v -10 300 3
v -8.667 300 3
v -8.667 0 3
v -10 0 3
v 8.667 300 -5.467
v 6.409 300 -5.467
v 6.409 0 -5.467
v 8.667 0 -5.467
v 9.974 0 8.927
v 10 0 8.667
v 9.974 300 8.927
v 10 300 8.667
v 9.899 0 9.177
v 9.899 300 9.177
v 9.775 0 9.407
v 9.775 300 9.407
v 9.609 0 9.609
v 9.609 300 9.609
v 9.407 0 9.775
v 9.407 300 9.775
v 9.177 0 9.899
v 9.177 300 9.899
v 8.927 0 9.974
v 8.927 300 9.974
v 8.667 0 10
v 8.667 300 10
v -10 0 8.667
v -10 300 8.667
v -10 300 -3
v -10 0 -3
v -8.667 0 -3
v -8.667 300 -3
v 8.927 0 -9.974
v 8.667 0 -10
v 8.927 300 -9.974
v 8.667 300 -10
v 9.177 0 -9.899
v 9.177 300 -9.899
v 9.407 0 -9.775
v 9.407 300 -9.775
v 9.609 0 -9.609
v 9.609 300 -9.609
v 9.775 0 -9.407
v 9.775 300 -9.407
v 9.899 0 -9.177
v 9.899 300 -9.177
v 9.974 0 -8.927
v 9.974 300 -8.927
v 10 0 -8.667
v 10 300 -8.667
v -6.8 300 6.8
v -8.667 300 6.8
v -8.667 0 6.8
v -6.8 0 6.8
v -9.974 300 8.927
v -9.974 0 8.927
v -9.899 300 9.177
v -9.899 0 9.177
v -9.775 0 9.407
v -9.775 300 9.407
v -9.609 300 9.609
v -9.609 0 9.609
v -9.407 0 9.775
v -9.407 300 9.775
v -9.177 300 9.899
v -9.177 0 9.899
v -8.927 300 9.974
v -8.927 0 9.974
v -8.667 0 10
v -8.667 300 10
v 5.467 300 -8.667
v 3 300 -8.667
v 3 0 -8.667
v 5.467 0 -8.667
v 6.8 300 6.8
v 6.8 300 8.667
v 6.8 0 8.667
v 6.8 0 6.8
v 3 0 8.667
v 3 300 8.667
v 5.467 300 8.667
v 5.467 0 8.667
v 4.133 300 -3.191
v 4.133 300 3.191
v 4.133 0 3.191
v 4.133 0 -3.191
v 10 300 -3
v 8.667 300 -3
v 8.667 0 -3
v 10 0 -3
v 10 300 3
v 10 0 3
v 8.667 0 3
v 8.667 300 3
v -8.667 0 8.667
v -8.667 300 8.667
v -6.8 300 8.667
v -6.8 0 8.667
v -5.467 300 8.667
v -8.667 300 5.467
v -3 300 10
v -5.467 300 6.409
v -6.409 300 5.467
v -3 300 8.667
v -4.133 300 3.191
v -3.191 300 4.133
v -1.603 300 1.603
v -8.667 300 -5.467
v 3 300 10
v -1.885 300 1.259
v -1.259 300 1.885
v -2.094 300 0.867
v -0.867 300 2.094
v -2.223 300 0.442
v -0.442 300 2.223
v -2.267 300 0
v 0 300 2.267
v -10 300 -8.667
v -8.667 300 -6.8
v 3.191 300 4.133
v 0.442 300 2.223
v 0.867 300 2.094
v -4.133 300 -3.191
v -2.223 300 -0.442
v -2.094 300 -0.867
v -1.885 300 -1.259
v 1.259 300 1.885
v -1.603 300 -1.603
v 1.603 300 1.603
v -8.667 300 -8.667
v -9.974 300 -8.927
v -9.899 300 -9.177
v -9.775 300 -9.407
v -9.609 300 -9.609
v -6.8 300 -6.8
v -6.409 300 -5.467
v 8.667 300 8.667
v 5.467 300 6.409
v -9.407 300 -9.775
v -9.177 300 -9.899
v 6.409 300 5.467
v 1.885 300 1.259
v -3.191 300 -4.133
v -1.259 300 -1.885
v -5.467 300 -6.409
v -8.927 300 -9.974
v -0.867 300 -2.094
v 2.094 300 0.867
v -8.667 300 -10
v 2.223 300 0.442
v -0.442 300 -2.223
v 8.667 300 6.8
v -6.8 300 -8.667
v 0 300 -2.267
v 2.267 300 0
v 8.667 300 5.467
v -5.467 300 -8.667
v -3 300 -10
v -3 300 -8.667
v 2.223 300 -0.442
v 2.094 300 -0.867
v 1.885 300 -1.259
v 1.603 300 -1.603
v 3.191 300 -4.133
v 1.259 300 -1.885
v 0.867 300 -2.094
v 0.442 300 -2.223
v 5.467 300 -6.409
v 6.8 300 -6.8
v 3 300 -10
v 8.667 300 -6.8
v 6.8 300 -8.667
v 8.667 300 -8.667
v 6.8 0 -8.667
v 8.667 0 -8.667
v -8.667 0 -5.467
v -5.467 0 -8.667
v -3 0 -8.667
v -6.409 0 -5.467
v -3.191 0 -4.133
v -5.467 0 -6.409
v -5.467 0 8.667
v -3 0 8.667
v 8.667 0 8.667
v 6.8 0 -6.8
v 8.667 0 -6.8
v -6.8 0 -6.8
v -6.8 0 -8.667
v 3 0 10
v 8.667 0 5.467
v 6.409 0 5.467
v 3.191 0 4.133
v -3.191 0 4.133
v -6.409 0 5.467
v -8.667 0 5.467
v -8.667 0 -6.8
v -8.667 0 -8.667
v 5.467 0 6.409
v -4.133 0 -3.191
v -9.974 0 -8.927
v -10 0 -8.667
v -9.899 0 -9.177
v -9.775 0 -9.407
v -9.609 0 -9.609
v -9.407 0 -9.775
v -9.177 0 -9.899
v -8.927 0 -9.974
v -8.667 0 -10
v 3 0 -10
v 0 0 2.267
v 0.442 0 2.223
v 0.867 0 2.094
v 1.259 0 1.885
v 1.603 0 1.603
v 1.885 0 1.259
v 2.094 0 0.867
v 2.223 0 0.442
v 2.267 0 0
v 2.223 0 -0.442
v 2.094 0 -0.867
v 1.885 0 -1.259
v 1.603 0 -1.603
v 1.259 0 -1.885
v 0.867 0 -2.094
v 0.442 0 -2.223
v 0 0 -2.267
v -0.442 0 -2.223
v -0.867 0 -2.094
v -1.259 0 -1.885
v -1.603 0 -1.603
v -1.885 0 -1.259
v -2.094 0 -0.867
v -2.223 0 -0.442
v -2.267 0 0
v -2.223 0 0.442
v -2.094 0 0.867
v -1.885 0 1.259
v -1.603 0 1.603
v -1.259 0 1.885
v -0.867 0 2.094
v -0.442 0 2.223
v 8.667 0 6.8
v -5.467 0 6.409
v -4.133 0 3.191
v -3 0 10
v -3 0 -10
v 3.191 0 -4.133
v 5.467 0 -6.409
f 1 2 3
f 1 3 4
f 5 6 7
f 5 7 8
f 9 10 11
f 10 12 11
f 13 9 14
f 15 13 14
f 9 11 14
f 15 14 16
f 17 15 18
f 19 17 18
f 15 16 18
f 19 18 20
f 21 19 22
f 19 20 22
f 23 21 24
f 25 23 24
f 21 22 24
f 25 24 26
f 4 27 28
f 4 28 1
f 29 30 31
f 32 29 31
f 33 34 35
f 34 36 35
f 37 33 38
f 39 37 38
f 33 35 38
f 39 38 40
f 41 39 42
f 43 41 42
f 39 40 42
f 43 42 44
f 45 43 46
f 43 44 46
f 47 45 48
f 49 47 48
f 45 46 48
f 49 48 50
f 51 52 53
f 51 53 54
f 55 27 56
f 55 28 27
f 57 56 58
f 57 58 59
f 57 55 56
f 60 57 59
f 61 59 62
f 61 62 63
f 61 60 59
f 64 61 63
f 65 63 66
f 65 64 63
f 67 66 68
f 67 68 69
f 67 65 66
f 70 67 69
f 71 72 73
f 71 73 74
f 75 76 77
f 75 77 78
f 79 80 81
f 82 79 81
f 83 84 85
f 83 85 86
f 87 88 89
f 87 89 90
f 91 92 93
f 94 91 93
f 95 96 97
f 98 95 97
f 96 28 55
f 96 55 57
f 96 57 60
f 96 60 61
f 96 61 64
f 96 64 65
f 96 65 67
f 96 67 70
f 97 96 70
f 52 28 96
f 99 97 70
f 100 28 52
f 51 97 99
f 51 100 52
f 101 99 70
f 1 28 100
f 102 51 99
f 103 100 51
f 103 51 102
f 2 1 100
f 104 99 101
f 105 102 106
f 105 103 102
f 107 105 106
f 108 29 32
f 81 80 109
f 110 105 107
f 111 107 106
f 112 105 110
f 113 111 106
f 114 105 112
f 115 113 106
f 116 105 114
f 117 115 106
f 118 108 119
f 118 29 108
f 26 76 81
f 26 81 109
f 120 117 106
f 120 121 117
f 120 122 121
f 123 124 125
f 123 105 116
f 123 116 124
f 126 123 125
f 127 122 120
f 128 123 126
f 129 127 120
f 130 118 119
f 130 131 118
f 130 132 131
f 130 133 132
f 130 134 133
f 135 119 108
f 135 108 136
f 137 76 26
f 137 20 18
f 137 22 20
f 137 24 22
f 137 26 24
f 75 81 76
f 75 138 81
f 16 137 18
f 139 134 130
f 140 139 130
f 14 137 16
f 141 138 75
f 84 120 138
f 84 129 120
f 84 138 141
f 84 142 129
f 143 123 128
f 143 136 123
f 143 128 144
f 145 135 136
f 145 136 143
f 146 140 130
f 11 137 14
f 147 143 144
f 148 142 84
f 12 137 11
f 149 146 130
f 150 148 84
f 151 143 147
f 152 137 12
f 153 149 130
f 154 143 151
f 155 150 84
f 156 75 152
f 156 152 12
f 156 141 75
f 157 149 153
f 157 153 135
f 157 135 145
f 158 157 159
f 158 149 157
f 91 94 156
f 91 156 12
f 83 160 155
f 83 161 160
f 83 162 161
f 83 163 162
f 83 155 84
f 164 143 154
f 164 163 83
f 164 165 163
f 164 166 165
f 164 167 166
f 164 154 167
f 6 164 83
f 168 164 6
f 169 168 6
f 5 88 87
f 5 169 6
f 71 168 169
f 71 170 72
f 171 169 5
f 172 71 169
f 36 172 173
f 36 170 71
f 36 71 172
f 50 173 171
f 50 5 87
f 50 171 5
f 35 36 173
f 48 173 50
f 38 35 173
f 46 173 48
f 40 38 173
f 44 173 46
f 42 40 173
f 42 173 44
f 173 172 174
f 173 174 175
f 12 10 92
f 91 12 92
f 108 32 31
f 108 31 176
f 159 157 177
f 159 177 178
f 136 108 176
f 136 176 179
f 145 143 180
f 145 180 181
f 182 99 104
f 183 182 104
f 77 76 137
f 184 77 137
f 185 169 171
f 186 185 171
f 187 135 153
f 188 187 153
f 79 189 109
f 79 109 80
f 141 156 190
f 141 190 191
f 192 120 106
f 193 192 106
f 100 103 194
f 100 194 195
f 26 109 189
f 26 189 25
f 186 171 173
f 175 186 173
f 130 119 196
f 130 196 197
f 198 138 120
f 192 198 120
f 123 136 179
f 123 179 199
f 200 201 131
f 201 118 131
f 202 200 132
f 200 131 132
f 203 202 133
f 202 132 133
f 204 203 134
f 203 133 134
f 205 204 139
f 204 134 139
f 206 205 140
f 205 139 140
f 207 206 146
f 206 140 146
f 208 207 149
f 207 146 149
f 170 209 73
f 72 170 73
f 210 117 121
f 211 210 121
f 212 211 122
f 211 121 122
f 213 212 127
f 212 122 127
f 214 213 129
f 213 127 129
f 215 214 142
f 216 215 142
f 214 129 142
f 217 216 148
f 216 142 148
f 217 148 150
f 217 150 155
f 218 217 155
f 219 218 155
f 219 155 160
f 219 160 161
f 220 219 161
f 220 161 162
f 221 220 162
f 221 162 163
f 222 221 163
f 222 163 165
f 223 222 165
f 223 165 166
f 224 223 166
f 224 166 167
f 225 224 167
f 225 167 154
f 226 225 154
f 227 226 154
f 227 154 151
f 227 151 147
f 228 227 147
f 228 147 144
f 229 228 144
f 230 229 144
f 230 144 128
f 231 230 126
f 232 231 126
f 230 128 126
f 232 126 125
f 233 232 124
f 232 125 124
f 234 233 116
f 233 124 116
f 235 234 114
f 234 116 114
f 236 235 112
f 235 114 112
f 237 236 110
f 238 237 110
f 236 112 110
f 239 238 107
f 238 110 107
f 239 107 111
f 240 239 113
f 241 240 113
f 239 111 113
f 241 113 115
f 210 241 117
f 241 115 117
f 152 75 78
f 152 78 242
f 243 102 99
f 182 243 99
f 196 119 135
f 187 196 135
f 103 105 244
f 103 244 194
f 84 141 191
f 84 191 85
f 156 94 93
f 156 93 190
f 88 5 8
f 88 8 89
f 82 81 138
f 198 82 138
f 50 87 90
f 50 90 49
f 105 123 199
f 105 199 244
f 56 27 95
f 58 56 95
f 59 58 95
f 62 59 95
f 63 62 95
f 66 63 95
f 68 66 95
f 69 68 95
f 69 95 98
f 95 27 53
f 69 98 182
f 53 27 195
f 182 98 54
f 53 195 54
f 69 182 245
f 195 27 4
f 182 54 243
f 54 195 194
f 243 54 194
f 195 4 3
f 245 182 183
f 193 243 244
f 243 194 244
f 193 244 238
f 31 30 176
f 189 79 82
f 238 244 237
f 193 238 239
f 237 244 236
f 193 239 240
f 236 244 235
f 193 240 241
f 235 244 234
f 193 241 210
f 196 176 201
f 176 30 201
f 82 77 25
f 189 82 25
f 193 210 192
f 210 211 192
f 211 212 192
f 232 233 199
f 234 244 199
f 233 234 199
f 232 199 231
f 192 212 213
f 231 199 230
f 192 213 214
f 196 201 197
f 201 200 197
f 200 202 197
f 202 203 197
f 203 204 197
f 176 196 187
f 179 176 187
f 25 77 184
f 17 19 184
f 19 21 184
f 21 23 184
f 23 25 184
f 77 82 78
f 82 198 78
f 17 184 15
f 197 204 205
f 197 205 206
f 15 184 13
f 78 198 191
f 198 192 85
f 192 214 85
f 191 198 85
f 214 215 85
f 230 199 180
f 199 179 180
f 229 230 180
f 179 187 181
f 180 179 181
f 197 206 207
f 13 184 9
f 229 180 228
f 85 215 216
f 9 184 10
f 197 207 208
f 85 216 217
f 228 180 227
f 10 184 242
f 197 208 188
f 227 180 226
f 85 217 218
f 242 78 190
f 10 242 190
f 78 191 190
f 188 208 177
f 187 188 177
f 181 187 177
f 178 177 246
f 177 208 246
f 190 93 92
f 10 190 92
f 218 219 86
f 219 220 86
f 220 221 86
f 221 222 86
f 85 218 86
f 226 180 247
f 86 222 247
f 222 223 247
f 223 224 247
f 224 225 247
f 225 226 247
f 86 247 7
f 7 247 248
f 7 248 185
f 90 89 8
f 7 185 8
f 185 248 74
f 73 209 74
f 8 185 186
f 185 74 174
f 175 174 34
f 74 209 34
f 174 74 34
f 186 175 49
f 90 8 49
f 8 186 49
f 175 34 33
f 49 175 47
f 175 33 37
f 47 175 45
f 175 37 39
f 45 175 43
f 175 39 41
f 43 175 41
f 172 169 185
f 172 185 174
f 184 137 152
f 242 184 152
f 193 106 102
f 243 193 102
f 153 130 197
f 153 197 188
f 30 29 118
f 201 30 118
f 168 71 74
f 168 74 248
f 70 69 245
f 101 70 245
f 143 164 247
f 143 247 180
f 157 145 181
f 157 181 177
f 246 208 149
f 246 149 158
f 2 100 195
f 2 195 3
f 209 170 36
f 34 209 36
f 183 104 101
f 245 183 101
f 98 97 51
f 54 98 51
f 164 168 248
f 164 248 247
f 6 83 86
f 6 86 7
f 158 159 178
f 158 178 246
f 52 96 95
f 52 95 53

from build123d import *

# Parameters (mm, degrees)
SKETCH1_W      = 20
SKETCH1_H      = 20
EXTRUDE1_DEPTH = 300
SKETCH2_R      = 2.266666667
SKETCH2_W      = 1.866666667
SKETCH2_H      = 1.866666667
EXTRUDE2_DEPTH = 301.333148354
FILLET1_R      = 1.333333333


with BuildPart() as part:
    # Sketch1 → Extrude1 (new body)
    with BuildSketch(Plane(origin=(0, 0, 0), x_dir=(1, 0, 0), z_dir=(0, 1, 0))):
        Rectangle(SKETCH1_W, SKETCH1_H)
    extrude(amount=EXTRUDE1_DEPTH)

    # Sketch2 → Extrude2 (cut, through all)
    with BuildSketch(Plane(origin=(0, 300, 0), x_dir=(1, 0, 0), z_dir=(0, 1, 0))):
        Circle(SKETCH2_R)
        Polygon((8.666666667, 3), (11.333333333, 3), (11.333333333, -3), (8.666666667, -3), (8.666666667, -5.466666667), (6.409475708, -5.466666667), (4.133333333, -3.190524292), (4.133333333, 3.190524292), (6.409475708, 5.466666667), (8.666666667, 5.466666667), align=None)
        with Locations((7.733333334, 7.733333334)):
            Rectangle(SKETCH2_W, SKETCH2_H)
        Polygon((-3.190524292, 4.133333333), (-5.466666667, 6.409475708), (-5.466666667, 8.666666667), (-3, 8.666666667), (-3, 11.333333333), (3, 11.333333333), (3, 8.666666667), (5.466666667, 8.666666667), (5.466666667, 6.409475708), (3.190524292, 4.133333333), align=None)
        with Locations((7.733333334, -7.733333334)):
            Rectangle(SKETCH2_W, SKETCH2_H)
        with Locations((-7.733333334, 7.733333334)):
            Rectangle(SKETCH2_W, SKETCH2_H)
        with Locations((-7.733333334, -7.733333334)):
            Rectangle(SKETCH2_W, SKETCH2_H)
        Polygon((-6.409475708, -5.466666667), (-8.666666667, -5.466666667), (-8.666666667, -3), (-11.333333333, -3), (-11.333333333, 3), (-8.666666667, 3), (-8.666666667, 5.466666667), (-6.409475708, 5.466666667), (-4.133333333, 3.190524292), (-4.133333333, -3.190524292), align=None)
        Polygon((3.190524292, -4.133333333), (-3.190524292, -4.133333333), (-5.466666667, -6.409475708), (-5.466666667, -8.666666667), (-3, -8.666666667), (-3, -11.333333333), (3, -11.333333333), (3, -8.666666667), (5.466666667, -8.666666667), (5.466666667, -6.409475708), align=None)
    extrude(amount=-EXTRUDE2_DEPTH, mode=Mode.SUBTRACT)

    # Fillet1
    fillet1_edges = [part.edges().sort_by_distance(p)[0] for p in [
        (10, 150, 10),
        (10, 150, -10),
        (-10, 150, 10),
        (-10, 150, -10),
    ]]
    fillet(fillet1_edges, radius=FILLET1_R)


solid = part.part
